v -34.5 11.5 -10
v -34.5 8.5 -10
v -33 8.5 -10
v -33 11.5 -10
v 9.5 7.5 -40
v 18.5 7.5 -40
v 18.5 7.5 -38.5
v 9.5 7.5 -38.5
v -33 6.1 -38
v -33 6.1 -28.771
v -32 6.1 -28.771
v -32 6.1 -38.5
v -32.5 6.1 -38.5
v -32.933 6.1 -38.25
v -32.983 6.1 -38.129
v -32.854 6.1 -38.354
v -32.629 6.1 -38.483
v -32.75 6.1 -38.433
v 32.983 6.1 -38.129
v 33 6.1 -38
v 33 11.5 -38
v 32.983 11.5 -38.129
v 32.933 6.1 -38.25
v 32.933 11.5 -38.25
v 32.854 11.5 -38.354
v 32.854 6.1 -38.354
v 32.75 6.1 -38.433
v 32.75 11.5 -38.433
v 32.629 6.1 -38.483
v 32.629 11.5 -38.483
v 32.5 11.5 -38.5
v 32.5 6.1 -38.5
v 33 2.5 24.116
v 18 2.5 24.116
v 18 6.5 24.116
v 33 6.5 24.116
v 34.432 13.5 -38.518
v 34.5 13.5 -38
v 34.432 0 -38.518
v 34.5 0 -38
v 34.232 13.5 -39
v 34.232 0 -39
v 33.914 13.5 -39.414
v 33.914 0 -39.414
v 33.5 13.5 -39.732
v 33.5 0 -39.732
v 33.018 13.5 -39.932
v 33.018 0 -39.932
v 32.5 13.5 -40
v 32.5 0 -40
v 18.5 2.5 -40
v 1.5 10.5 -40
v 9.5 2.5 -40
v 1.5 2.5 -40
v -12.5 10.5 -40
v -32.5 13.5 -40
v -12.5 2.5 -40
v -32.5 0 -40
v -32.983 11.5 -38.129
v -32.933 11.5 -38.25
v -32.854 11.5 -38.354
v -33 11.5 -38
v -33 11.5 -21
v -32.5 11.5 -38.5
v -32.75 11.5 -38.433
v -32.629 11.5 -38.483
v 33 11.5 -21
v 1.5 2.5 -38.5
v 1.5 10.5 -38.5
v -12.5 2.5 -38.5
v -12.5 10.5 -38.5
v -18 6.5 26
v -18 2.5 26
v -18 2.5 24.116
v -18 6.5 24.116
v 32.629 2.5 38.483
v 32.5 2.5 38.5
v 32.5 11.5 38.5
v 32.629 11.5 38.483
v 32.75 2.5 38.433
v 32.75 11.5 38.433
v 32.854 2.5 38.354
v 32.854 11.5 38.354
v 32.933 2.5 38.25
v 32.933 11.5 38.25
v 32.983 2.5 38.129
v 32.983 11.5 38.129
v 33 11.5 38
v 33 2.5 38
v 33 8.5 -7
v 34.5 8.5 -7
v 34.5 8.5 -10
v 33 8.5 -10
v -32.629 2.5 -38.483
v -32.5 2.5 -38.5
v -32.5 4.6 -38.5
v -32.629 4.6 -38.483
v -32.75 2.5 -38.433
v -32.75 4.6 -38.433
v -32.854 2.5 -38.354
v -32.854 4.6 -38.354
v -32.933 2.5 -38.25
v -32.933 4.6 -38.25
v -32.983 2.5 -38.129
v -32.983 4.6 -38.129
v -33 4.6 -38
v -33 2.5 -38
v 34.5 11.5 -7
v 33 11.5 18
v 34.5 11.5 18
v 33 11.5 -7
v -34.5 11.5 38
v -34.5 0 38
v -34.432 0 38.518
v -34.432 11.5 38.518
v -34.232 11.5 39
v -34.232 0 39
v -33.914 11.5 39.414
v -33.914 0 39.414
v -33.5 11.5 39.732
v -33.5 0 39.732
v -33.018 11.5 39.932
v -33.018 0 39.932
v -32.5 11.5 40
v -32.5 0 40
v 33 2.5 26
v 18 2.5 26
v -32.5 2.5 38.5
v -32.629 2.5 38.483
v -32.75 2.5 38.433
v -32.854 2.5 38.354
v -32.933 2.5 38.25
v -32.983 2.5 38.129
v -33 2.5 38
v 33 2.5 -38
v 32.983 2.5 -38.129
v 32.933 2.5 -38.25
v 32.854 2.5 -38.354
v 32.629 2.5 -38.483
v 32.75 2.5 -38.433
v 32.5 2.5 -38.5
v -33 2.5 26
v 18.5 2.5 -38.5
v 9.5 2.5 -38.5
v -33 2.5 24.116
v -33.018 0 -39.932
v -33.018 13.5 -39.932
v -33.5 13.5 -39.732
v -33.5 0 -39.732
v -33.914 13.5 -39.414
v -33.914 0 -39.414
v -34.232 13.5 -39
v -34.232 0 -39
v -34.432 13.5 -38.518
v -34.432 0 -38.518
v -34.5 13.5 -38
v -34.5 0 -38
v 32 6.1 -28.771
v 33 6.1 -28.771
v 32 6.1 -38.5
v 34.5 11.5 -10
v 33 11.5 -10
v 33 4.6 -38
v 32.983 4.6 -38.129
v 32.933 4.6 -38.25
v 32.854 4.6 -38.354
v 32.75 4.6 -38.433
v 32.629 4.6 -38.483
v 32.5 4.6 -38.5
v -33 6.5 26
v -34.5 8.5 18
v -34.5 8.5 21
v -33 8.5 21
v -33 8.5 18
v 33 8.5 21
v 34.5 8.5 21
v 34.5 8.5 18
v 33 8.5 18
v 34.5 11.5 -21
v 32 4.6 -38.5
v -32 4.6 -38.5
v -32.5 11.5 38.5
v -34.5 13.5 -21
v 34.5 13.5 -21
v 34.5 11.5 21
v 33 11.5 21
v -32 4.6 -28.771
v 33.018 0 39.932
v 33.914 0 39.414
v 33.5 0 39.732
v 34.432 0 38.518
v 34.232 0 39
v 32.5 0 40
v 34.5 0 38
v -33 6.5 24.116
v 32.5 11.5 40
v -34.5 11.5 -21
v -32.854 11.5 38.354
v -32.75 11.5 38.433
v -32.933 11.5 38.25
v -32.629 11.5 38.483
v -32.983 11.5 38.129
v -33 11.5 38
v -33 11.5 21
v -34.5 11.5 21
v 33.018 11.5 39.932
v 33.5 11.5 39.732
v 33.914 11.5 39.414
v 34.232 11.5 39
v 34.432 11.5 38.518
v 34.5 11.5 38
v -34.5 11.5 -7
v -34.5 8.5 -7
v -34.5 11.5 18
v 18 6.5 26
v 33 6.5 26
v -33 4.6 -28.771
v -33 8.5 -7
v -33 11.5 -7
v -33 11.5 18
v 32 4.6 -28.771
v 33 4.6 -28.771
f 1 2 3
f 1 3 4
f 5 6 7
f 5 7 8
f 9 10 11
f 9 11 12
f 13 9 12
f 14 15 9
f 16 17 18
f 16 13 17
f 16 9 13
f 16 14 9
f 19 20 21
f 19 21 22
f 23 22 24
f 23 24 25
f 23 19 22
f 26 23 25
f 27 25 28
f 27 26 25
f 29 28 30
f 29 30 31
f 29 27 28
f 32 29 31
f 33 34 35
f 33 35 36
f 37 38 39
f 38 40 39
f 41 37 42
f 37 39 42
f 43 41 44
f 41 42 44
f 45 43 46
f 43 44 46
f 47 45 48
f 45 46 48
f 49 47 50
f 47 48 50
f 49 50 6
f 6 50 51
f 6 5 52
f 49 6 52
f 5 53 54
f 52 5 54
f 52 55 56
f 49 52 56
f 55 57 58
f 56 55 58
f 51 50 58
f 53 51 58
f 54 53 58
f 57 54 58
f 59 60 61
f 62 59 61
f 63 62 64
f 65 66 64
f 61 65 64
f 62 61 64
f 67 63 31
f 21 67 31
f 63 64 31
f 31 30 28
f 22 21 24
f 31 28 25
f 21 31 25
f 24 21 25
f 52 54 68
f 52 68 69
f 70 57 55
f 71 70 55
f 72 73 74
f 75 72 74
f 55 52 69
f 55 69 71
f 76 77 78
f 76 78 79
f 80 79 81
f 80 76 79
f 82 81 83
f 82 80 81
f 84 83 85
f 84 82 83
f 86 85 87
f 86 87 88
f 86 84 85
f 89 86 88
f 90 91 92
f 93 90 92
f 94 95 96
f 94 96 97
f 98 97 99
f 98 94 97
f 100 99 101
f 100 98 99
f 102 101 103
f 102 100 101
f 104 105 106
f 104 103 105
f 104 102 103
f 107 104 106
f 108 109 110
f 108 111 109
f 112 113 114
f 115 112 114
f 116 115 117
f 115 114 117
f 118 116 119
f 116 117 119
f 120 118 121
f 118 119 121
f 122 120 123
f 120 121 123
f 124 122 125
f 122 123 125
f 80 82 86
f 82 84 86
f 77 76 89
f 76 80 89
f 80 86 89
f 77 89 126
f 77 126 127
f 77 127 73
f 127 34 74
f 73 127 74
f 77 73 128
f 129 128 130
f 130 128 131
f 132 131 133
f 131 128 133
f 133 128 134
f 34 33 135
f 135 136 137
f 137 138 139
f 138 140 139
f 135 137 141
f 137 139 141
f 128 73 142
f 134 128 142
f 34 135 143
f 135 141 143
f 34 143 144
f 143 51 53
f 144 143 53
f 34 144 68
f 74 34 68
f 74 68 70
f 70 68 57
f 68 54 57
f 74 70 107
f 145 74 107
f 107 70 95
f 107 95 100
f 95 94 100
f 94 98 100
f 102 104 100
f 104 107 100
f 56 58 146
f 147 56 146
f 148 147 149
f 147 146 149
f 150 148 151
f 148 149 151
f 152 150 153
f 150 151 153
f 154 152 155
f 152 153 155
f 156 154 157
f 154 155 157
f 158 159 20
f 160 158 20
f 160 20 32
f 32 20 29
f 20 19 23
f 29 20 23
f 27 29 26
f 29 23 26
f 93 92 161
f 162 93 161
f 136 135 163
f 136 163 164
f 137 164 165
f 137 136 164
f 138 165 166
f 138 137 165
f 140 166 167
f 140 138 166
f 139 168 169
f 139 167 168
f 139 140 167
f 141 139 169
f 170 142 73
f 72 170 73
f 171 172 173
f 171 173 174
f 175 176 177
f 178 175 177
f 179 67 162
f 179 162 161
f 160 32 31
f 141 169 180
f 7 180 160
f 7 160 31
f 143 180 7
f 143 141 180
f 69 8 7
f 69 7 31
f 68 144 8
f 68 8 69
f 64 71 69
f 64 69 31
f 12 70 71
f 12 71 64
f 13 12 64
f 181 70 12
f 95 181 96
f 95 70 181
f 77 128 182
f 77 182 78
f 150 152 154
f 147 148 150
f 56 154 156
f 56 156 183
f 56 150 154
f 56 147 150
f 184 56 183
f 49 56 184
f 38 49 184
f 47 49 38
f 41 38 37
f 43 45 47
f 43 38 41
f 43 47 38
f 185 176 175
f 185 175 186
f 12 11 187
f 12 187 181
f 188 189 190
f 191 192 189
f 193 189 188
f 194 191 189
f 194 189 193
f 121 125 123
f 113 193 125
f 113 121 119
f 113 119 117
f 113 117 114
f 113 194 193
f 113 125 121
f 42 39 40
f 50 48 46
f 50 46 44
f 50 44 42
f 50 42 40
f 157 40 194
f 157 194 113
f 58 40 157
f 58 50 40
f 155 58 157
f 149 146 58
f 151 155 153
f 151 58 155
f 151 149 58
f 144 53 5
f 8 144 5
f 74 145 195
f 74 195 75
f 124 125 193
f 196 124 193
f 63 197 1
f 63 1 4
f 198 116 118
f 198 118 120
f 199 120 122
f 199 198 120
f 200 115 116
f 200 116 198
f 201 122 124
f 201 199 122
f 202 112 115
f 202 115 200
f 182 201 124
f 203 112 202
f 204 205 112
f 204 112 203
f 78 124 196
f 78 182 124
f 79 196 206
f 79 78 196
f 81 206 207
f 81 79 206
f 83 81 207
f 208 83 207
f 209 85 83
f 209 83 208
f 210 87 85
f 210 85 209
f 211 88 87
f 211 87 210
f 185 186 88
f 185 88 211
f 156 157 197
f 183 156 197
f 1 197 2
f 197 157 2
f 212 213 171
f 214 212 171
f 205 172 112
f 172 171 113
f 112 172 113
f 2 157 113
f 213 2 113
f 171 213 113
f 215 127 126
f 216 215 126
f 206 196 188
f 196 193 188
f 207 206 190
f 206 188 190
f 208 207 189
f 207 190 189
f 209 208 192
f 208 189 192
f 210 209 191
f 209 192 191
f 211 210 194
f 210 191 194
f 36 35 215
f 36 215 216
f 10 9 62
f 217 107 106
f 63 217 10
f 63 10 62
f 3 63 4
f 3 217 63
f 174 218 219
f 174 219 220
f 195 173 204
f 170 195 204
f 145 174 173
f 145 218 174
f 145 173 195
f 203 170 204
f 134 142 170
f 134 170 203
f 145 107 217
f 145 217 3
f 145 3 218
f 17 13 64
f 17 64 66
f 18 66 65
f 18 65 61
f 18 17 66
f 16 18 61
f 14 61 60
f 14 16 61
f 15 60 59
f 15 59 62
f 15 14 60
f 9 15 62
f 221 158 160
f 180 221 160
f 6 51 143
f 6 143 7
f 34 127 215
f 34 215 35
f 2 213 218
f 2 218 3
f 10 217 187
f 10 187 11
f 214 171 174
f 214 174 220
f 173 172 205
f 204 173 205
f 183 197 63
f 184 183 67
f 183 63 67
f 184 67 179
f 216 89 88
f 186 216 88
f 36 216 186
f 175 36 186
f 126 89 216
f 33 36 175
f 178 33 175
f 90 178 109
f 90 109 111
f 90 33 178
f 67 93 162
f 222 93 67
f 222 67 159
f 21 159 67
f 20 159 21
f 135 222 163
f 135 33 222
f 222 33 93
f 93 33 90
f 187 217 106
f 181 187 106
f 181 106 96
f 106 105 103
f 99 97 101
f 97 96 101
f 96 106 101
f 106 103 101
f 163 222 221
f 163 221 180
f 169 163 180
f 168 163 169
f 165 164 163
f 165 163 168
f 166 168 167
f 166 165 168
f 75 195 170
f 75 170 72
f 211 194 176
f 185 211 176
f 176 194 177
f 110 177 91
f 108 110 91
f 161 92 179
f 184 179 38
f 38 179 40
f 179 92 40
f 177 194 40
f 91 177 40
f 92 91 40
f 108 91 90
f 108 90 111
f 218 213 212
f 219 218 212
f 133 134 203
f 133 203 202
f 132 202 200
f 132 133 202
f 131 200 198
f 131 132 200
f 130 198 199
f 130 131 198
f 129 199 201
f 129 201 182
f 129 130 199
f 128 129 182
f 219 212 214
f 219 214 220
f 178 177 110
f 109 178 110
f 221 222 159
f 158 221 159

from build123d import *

# Parameters (mm, degrees)
EXTRUDE_1_DEPTH     = 2.5
EXTRUDE_2_DEPTH     = 9
SKETCH_6_W          = 14
SKETCH_6_H          = 8
SKETCH_6_W_2        = 9
SKETCH_6_H_2        = 5
CUT_EXTRUDE_3_DEPTH = 9
SKETCH_7_W          = 10
SKETCH_7_H          = 1.5
EXTRUDE_3_DEPTH     = 1
SKETCH_8_W          = 3
SKETCH_8_H          = 3
CUT_EXTRUDE_4_DEPTH = 5
EXTRUDE_4_DEPTH     = 2
SKETCH_10_W         = 15
SKETCH_10_H         = 1.883979019
EXTRUDE_5_DEPTH     = 4


with BuildPart() as part:
    # 草图1 → 凸台-拉伸1 (new body)
    with BuildSketch(Plane(origin=(0, 0, 0), x_dir=(1, 0, 0), z_dir=(0, 1, 0))):
        with BuildLine():
            Line((-32.5, 40), (32.5, 40))
            ThreePointArc((32.5, 40), (33.914213562, 39.414213562), (34.5, 38))
            Line((34.5, 38), (34.5, -38))
            ThreePointArc((34.5, -38), (33.914213562, -39.414213562), (32.5, -40))
            Line((32.5, -40), (-32.5, -40))
            ThreePointArc((-32.5, -40), (-33.914213562, -39.414213562), (-34.5, -38))
            Line((-34.5, -38), (-34.5, 38))
            ThreePointArc((-34.5, 38), (-33.914213562, 39.414213562), (-32.5, 40))
        make_face()
    extrude(amount=EXTRUDE_1_DEPTH)

    # 草图2 → 凸台-拉伸2 (add)
    with BuildSketch(Plane(origin=(0, 2.5, 0), x_dir=(1, 0, 0), z_dir=(0, 1, 0))):
        with BuildLine():
            Line((-32.5, -40), (32.5, -40))
            ThreePointArc((32.5, -40), (33.914213562, -39.414213562), (34.5, -38))
            Line((34.5, -38), (34.5, 38))
            ThreePointArc((34.5, 38), (33.914213562, 39.414213562), (32.5, 40))
            Line((32.5, 40), (-32.5, 40))
            ThreePointArc((-32.5, 40), (-33.914213562, 39.414213562), (-34.5, 38))
            Line((-34.5, 38), (-34.5, -38))
            ThreePointArc((-34.5, -38), (-33.914213562, -39.414213562), (-32.5, -40))
        make_face()
        with BuildLine():
            Line((-32.5, -38.5), (32.5, -38.5))
            ThreePointArc((32.5, -38.5), (32.853553391, -38.353553391), (33, -38))
            Line((33, -38), (33, 38))
            ThreePointArc((33, 38), (32.853553391, 38.353553391), (32.5, 38.5))
            Line((32.5, 38.5), (-32.5, 38.5))
            ThreePointArc((-32.5, 38.5), (-32.853553391, 38.353553391), (-33, 38))
            Line((-33, 38), (-33, -38))
            ThreePointArc((-33, -38), (-32.853553391, -38.353553391), (-32.5, -38.5))
        make_face(mode=Mode.SUBTRACT)
    extrude(amount=EXTRUDE_2_DEPTH)

    # 草图6 → 切除-拉伸3 (cut)
    with BuildSketch(Plane(origin=(0, 0, -40), x_dir=(-1, 0, 0), z_dir=(0, 0, -1))):
        with Locations((5.5, 6.5)):
            Rectangle(SKETCH_6_W, SKETCH_6_H)
        with Locations((-14, 5)):
            Rectangle(SKETCH_6_W_2, SKETCH_6_H_2)
    extrude(amount=-CUT_EXTRUDE_3_DEPTH, mode=Mode.SUBTRACT)

    # 草图7 → 凸台-拉伸3 (add)
    with BuildSketch(Plane(origin=(-33, 0, 0), x_dir=(0, 0, -1), z_dir=(1, 0, 0))):
        with Locations((33.771264053, 5.35)):
            Rectangle(SKETCH_7_W, SKETCH_7_H)
    extrude_3 = extrude(amount=EXTRUDE_3_DEPTH)

    # 镜向1: 凸台-拉伸3 across plane
    add(extrude_3.mirror(Plane(origin=(0, 0, 0), x_dir=(0, 0, 1), z_dir=(1, 0, 0))))

    # 草图8 → 切除-拉伸4 (cut)
    with BuildSketch(Plane(origin=(34.5, 0, 0), x_dir=(0, 0, -1), z_dir=(1, 0, 0))):
        with Locations((8.5, 10)):
            Rectangle(SKETCH_8_W, SKETCH_8_H)
        with Locations((-19.5, 10)):
            Rectangle(SKETCH_8_W, SKETCH_8_H)
    cut_extrude_4 = extrude(amount=-CUT_EXTRUDE_4_DEPTH, mode=Mode.SUBTRACT)

    # 镜向2: 切除-拉伸4 across plane
    add(cut_extrude_4.mirror(Plane(origin=(0, 0, 0), x_dir=(0, 0, 1), z_dir=(1, 0, 0))), mode=Mode.SUBTRACT)

    # 草图9 → 凸台-拉伸4 (add)
    with BuildSketch(Plane(origin=(0, 11.5, 0), x_dir=(1, 0, 0), z_dir=(0, 1, 0))):
        with BuildLine():
            Line((-34.5, 21), (34.5, 21))
            Line((34.5, 21), (34.5, 38))
            ThreePointArc((34.5, 38), (33.914213562, 39.414213562), (32.5, 40))
            Line((32.5, 40), (-32.5, 40))
            ThreePointArc((-32.5, 40), (-33.914213562, 39.414213562), (-34.5, 38))
            Line((-34.5, 38), (-34.5, 21))
        make_face()
    extrude(amount=EXTRUDE_4_DEPTH)

    # 草图10 → 凸台-拉伸5 (add)
    with BuildSketch(Plane(origin=(0, 2.5, 0), x_dir=(1, 0, 0), z_dir=(0, 1, 0))):
        with Locations((-25.5, -25.058010491)):
            Rectangle(SKETCH_10_W, SKETCH_10_H)
        with Locations((25.5, -25.058010491)):
            Rectangle(SKETCH_10_W, SKETCH_10_H)
    extrude(amount=EXTRUDE_5_DEPTH)


solid = part.part
